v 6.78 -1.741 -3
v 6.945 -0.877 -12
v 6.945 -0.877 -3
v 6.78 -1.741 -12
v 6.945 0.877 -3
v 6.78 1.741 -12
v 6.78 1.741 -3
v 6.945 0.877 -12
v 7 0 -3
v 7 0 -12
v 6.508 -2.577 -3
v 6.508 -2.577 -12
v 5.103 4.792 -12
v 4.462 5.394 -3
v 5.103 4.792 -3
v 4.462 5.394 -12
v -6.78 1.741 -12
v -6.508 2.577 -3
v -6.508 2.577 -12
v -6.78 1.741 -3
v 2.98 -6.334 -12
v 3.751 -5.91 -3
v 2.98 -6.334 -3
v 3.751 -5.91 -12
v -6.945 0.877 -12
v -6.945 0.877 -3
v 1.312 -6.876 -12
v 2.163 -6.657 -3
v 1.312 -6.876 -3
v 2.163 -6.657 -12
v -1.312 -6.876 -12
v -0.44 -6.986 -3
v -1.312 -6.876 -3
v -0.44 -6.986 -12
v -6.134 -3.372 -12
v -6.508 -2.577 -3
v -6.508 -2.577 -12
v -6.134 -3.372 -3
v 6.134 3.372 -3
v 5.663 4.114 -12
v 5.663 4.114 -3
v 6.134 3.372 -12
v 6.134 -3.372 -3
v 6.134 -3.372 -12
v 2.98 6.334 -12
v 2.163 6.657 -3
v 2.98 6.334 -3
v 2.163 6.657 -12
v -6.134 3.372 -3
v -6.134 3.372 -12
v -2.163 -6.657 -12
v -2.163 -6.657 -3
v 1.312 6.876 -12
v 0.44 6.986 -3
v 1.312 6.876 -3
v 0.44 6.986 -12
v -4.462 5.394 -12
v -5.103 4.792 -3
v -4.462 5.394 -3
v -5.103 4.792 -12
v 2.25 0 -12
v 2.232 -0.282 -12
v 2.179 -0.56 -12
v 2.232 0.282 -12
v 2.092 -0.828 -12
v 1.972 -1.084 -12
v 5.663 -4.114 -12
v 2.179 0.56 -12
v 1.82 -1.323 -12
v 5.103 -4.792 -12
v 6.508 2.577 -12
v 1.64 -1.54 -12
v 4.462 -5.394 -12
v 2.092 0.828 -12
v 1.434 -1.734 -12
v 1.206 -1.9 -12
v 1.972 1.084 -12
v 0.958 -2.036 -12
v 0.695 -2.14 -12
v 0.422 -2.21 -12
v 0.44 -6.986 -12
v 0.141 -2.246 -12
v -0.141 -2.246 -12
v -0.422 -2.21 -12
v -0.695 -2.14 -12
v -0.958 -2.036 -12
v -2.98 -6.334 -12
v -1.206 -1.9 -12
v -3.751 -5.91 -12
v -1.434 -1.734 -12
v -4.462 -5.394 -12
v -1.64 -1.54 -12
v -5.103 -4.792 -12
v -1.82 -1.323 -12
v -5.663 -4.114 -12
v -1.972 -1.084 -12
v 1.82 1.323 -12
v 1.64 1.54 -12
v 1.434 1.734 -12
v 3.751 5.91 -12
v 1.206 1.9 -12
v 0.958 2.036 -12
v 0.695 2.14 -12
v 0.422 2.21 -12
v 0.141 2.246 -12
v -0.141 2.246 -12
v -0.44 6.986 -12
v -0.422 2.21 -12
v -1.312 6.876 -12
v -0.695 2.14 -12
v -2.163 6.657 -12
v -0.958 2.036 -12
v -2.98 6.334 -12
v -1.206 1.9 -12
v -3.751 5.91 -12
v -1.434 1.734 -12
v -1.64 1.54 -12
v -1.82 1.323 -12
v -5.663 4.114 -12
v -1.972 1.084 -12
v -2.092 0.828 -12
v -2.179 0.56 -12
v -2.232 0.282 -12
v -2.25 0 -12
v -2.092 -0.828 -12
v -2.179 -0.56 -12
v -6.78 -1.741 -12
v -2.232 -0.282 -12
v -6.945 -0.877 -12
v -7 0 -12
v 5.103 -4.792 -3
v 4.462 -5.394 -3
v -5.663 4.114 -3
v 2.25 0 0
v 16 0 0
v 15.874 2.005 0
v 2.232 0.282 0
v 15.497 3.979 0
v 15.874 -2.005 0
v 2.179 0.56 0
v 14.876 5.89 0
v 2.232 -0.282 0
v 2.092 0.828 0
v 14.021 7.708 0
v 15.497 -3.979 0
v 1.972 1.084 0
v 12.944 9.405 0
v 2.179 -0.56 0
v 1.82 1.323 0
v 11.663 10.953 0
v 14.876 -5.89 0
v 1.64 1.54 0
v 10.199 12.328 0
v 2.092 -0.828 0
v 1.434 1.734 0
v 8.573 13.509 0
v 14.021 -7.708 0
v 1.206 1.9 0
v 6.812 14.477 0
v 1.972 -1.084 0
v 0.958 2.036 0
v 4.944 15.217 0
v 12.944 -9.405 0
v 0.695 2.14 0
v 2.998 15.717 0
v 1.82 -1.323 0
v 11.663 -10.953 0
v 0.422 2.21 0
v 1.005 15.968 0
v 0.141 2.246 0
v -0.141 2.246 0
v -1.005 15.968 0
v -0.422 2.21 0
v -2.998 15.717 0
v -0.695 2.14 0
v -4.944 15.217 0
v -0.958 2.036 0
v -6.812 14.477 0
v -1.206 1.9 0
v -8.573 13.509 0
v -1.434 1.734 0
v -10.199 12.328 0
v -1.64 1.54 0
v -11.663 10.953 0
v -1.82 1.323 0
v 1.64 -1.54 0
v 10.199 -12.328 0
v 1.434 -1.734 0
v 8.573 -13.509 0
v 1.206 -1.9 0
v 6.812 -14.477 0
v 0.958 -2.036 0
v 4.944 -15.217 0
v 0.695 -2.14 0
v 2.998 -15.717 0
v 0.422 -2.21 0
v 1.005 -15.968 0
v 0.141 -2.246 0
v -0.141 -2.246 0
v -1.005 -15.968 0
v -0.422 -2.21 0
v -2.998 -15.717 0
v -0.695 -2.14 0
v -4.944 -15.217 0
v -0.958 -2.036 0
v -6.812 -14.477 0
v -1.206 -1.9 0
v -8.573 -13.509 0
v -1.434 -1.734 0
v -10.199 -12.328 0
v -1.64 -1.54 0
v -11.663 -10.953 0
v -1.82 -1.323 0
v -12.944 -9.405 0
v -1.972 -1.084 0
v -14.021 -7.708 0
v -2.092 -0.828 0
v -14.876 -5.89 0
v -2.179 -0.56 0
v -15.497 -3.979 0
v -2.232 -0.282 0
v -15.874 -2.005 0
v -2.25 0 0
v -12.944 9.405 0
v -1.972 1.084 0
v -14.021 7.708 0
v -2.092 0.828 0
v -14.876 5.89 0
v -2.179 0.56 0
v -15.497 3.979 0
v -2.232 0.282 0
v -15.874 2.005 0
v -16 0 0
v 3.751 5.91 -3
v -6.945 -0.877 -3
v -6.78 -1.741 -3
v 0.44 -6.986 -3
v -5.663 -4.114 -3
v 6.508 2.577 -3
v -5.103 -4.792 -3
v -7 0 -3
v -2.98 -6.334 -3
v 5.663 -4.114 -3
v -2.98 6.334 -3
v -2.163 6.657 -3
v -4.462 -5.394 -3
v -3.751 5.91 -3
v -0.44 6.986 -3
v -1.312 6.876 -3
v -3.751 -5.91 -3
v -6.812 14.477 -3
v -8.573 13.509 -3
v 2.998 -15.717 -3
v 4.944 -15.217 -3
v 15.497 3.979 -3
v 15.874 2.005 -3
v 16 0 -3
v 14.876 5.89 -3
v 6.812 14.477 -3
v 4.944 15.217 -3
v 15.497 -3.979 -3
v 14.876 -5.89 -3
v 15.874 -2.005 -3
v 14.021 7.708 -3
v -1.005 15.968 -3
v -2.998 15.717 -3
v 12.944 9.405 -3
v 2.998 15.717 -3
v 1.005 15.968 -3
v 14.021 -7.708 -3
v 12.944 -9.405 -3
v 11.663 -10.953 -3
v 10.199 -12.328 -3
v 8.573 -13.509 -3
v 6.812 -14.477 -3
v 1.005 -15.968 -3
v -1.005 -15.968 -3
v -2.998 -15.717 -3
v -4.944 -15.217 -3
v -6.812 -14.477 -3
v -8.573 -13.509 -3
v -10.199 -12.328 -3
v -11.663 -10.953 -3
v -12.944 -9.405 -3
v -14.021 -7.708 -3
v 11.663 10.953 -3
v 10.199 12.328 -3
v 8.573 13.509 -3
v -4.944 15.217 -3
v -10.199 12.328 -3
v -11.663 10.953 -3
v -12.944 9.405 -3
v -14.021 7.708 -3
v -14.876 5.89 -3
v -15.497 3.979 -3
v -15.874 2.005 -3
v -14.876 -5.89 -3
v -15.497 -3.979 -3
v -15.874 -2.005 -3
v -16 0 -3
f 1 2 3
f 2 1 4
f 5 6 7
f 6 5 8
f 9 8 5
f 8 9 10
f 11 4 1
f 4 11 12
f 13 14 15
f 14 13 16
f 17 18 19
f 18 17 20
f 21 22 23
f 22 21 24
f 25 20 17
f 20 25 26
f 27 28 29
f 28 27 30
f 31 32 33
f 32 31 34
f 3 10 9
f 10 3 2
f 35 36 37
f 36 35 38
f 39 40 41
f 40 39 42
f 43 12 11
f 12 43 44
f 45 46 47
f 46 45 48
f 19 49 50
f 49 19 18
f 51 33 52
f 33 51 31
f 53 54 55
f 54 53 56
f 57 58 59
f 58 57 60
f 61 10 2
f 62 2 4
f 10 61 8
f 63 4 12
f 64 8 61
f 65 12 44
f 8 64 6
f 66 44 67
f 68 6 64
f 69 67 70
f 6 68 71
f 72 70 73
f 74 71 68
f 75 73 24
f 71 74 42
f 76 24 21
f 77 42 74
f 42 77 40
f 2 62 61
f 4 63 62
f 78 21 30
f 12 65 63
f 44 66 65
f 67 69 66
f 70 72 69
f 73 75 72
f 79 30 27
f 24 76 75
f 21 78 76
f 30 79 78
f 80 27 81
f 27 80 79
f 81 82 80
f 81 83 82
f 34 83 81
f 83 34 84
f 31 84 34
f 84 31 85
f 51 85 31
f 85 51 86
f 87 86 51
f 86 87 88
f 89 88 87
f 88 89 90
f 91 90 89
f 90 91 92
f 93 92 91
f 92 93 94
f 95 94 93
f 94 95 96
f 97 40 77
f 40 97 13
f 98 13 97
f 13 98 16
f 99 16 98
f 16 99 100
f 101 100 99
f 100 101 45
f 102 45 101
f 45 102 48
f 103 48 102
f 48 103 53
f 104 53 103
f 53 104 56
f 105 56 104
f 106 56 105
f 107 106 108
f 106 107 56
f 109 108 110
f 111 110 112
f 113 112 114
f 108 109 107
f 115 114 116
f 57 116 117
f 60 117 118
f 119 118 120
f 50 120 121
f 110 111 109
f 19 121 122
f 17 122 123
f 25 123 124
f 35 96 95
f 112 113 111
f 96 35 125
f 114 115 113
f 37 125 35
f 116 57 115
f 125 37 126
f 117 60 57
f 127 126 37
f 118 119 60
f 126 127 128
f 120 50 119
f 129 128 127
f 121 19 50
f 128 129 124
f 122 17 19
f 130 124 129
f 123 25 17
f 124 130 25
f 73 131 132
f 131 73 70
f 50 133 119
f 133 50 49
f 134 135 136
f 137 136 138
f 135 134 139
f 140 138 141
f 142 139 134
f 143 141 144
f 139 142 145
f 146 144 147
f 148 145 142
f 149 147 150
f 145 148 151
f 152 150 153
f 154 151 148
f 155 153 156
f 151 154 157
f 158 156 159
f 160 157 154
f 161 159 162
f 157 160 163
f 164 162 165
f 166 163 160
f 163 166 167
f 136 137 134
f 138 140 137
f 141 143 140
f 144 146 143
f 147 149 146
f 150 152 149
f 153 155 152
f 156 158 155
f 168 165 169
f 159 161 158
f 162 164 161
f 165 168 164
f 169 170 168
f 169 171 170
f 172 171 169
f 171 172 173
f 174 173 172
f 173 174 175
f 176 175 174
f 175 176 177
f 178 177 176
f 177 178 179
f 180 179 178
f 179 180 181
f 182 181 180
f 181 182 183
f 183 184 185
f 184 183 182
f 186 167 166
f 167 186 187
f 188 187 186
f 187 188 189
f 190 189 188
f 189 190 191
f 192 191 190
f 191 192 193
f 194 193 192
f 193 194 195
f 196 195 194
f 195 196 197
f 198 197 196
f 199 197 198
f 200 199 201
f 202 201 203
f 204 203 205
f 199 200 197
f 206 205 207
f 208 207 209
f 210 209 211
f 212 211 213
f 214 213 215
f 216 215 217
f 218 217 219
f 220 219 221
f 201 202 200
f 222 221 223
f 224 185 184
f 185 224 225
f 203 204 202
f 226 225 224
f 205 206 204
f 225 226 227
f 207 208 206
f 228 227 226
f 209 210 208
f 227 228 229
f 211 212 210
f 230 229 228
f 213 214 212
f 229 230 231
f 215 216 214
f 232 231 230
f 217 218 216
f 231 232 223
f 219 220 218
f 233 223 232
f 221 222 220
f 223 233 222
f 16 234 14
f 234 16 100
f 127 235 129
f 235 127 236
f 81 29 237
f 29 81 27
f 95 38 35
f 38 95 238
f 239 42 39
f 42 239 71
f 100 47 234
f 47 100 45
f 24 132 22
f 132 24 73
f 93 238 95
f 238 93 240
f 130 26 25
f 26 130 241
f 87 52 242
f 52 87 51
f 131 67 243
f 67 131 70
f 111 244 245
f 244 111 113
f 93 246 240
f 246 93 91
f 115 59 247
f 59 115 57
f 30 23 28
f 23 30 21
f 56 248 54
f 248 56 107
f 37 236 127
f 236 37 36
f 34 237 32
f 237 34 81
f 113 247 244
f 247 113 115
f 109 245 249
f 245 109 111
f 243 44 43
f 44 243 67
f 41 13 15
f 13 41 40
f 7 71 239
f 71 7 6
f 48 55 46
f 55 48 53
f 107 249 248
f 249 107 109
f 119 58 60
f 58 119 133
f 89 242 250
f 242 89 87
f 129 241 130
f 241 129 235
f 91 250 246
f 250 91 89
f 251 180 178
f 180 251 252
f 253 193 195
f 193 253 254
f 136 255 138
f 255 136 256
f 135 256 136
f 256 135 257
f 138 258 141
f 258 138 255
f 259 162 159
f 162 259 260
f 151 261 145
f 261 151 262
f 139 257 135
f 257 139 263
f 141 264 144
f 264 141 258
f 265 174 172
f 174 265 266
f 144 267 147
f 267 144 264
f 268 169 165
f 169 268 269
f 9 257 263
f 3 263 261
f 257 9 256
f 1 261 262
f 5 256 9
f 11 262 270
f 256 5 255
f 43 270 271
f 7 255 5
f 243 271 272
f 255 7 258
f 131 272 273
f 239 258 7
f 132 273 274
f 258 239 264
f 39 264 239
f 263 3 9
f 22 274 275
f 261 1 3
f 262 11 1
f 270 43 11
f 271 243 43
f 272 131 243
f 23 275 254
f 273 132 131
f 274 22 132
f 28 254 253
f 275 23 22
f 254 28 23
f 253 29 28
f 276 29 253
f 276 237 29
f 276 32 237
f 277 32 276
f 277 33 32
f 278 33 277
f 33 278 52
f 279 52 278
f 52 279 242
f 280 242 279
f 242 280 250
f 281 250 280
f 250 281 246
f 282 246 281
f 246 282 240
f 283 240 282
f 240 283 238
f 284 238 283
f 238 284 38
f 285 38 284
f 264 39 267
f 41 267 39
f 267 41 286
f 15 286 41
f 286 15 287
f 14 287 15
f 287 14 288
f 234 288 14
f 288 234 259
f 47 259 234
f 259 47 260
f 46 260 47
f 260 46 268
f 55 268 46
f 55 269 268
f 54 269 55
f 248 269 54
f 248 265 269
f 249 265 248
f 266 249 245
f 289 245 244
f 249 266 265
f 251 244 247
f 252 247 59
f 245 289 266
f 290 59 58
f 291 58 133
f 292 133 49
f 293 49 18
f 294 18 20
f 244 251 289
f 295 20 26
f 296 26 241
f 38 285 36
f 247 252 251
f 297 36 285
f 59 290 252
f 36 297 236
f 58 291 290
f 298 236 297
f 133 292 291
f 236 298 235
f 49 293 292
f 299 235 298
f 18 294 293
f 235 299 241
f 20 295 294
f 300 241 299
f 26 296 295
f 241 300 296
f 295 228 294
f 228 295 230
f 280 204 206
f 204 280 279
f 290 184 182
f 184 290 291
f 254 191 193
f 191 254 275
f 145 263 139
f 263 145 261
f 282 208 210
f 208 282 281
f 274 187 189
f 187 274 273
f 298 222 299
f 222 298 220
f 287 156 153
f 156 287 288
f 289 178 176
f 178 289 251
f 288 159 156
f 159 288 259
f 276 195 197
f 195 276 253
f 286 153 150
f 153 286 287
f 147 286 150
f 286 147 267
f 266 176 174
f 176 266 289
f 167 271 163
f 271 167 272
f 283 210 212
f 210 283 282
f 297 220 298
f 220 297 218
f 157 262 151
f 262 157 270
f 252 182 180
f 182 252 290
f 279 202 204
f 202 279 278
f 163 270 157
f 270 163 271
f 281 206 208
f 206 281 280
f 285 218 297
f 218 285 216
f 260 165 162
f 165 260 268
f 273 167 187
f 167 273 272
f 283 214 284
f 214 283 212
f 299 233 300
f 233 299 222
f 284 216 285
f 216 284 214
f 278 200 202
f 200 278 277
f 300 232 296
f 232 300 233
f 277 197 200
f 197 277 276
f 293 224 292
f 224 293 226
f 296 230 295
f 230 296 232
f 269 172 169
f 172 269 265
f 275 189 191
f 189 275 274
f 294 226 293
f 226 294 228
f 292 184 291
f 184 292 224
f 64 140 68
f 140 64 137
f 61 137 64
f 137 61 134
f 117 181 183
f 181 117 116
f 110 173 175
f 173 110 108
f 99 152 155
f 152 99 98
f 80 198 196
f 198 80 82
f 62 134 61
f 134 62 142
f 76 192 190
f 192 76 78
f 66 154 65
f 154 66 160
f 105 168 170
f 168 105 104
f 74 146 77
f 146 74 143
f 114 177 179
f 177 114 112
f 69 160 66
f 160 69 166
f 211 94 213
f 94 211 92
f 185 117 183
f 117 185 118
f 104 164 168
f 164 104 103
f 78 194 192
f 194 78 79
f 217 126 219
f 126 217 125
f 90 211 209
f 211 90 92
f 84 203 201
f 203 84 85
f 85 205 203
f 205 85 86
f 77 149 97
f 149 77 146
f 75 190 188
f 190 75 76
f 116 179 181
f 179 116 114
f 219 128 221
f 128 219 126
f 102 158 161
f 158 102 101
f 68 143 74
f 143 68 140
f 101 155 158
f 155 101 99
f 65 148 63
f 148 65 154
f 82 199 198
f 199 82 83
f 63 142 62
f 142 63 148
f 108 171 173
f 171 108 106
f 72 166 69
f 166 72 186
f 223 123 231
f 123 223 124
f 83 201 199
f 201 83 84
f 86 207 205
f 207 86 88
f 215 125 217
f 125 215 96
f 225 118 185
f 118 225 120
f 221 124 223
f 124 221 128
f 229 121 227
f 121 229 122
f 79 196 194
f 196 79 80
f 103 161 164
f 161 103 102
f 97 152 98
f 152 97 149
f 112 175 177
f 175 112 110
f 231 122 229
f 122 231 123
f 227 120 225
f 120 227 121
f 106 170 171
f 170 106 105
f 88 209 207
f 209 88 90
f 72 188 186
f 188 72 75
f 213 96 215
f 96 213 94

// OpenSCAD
$fn = 50;


difference() {
	union() {
		translate(v = [0, 0, -12.0000000000]) {
			cylinder(h = 12, r = 7.0000000000);
		}
		translate(v = [0, 0, -3.0000000000]) {
			cylinder(h = 3, r = 16.0000000000);
		}
	}
	union() {
		#translate(v = [0, 0, -12]) {
			cylinder(h = 12, r = 2.2500000000);
		}
	}
}
